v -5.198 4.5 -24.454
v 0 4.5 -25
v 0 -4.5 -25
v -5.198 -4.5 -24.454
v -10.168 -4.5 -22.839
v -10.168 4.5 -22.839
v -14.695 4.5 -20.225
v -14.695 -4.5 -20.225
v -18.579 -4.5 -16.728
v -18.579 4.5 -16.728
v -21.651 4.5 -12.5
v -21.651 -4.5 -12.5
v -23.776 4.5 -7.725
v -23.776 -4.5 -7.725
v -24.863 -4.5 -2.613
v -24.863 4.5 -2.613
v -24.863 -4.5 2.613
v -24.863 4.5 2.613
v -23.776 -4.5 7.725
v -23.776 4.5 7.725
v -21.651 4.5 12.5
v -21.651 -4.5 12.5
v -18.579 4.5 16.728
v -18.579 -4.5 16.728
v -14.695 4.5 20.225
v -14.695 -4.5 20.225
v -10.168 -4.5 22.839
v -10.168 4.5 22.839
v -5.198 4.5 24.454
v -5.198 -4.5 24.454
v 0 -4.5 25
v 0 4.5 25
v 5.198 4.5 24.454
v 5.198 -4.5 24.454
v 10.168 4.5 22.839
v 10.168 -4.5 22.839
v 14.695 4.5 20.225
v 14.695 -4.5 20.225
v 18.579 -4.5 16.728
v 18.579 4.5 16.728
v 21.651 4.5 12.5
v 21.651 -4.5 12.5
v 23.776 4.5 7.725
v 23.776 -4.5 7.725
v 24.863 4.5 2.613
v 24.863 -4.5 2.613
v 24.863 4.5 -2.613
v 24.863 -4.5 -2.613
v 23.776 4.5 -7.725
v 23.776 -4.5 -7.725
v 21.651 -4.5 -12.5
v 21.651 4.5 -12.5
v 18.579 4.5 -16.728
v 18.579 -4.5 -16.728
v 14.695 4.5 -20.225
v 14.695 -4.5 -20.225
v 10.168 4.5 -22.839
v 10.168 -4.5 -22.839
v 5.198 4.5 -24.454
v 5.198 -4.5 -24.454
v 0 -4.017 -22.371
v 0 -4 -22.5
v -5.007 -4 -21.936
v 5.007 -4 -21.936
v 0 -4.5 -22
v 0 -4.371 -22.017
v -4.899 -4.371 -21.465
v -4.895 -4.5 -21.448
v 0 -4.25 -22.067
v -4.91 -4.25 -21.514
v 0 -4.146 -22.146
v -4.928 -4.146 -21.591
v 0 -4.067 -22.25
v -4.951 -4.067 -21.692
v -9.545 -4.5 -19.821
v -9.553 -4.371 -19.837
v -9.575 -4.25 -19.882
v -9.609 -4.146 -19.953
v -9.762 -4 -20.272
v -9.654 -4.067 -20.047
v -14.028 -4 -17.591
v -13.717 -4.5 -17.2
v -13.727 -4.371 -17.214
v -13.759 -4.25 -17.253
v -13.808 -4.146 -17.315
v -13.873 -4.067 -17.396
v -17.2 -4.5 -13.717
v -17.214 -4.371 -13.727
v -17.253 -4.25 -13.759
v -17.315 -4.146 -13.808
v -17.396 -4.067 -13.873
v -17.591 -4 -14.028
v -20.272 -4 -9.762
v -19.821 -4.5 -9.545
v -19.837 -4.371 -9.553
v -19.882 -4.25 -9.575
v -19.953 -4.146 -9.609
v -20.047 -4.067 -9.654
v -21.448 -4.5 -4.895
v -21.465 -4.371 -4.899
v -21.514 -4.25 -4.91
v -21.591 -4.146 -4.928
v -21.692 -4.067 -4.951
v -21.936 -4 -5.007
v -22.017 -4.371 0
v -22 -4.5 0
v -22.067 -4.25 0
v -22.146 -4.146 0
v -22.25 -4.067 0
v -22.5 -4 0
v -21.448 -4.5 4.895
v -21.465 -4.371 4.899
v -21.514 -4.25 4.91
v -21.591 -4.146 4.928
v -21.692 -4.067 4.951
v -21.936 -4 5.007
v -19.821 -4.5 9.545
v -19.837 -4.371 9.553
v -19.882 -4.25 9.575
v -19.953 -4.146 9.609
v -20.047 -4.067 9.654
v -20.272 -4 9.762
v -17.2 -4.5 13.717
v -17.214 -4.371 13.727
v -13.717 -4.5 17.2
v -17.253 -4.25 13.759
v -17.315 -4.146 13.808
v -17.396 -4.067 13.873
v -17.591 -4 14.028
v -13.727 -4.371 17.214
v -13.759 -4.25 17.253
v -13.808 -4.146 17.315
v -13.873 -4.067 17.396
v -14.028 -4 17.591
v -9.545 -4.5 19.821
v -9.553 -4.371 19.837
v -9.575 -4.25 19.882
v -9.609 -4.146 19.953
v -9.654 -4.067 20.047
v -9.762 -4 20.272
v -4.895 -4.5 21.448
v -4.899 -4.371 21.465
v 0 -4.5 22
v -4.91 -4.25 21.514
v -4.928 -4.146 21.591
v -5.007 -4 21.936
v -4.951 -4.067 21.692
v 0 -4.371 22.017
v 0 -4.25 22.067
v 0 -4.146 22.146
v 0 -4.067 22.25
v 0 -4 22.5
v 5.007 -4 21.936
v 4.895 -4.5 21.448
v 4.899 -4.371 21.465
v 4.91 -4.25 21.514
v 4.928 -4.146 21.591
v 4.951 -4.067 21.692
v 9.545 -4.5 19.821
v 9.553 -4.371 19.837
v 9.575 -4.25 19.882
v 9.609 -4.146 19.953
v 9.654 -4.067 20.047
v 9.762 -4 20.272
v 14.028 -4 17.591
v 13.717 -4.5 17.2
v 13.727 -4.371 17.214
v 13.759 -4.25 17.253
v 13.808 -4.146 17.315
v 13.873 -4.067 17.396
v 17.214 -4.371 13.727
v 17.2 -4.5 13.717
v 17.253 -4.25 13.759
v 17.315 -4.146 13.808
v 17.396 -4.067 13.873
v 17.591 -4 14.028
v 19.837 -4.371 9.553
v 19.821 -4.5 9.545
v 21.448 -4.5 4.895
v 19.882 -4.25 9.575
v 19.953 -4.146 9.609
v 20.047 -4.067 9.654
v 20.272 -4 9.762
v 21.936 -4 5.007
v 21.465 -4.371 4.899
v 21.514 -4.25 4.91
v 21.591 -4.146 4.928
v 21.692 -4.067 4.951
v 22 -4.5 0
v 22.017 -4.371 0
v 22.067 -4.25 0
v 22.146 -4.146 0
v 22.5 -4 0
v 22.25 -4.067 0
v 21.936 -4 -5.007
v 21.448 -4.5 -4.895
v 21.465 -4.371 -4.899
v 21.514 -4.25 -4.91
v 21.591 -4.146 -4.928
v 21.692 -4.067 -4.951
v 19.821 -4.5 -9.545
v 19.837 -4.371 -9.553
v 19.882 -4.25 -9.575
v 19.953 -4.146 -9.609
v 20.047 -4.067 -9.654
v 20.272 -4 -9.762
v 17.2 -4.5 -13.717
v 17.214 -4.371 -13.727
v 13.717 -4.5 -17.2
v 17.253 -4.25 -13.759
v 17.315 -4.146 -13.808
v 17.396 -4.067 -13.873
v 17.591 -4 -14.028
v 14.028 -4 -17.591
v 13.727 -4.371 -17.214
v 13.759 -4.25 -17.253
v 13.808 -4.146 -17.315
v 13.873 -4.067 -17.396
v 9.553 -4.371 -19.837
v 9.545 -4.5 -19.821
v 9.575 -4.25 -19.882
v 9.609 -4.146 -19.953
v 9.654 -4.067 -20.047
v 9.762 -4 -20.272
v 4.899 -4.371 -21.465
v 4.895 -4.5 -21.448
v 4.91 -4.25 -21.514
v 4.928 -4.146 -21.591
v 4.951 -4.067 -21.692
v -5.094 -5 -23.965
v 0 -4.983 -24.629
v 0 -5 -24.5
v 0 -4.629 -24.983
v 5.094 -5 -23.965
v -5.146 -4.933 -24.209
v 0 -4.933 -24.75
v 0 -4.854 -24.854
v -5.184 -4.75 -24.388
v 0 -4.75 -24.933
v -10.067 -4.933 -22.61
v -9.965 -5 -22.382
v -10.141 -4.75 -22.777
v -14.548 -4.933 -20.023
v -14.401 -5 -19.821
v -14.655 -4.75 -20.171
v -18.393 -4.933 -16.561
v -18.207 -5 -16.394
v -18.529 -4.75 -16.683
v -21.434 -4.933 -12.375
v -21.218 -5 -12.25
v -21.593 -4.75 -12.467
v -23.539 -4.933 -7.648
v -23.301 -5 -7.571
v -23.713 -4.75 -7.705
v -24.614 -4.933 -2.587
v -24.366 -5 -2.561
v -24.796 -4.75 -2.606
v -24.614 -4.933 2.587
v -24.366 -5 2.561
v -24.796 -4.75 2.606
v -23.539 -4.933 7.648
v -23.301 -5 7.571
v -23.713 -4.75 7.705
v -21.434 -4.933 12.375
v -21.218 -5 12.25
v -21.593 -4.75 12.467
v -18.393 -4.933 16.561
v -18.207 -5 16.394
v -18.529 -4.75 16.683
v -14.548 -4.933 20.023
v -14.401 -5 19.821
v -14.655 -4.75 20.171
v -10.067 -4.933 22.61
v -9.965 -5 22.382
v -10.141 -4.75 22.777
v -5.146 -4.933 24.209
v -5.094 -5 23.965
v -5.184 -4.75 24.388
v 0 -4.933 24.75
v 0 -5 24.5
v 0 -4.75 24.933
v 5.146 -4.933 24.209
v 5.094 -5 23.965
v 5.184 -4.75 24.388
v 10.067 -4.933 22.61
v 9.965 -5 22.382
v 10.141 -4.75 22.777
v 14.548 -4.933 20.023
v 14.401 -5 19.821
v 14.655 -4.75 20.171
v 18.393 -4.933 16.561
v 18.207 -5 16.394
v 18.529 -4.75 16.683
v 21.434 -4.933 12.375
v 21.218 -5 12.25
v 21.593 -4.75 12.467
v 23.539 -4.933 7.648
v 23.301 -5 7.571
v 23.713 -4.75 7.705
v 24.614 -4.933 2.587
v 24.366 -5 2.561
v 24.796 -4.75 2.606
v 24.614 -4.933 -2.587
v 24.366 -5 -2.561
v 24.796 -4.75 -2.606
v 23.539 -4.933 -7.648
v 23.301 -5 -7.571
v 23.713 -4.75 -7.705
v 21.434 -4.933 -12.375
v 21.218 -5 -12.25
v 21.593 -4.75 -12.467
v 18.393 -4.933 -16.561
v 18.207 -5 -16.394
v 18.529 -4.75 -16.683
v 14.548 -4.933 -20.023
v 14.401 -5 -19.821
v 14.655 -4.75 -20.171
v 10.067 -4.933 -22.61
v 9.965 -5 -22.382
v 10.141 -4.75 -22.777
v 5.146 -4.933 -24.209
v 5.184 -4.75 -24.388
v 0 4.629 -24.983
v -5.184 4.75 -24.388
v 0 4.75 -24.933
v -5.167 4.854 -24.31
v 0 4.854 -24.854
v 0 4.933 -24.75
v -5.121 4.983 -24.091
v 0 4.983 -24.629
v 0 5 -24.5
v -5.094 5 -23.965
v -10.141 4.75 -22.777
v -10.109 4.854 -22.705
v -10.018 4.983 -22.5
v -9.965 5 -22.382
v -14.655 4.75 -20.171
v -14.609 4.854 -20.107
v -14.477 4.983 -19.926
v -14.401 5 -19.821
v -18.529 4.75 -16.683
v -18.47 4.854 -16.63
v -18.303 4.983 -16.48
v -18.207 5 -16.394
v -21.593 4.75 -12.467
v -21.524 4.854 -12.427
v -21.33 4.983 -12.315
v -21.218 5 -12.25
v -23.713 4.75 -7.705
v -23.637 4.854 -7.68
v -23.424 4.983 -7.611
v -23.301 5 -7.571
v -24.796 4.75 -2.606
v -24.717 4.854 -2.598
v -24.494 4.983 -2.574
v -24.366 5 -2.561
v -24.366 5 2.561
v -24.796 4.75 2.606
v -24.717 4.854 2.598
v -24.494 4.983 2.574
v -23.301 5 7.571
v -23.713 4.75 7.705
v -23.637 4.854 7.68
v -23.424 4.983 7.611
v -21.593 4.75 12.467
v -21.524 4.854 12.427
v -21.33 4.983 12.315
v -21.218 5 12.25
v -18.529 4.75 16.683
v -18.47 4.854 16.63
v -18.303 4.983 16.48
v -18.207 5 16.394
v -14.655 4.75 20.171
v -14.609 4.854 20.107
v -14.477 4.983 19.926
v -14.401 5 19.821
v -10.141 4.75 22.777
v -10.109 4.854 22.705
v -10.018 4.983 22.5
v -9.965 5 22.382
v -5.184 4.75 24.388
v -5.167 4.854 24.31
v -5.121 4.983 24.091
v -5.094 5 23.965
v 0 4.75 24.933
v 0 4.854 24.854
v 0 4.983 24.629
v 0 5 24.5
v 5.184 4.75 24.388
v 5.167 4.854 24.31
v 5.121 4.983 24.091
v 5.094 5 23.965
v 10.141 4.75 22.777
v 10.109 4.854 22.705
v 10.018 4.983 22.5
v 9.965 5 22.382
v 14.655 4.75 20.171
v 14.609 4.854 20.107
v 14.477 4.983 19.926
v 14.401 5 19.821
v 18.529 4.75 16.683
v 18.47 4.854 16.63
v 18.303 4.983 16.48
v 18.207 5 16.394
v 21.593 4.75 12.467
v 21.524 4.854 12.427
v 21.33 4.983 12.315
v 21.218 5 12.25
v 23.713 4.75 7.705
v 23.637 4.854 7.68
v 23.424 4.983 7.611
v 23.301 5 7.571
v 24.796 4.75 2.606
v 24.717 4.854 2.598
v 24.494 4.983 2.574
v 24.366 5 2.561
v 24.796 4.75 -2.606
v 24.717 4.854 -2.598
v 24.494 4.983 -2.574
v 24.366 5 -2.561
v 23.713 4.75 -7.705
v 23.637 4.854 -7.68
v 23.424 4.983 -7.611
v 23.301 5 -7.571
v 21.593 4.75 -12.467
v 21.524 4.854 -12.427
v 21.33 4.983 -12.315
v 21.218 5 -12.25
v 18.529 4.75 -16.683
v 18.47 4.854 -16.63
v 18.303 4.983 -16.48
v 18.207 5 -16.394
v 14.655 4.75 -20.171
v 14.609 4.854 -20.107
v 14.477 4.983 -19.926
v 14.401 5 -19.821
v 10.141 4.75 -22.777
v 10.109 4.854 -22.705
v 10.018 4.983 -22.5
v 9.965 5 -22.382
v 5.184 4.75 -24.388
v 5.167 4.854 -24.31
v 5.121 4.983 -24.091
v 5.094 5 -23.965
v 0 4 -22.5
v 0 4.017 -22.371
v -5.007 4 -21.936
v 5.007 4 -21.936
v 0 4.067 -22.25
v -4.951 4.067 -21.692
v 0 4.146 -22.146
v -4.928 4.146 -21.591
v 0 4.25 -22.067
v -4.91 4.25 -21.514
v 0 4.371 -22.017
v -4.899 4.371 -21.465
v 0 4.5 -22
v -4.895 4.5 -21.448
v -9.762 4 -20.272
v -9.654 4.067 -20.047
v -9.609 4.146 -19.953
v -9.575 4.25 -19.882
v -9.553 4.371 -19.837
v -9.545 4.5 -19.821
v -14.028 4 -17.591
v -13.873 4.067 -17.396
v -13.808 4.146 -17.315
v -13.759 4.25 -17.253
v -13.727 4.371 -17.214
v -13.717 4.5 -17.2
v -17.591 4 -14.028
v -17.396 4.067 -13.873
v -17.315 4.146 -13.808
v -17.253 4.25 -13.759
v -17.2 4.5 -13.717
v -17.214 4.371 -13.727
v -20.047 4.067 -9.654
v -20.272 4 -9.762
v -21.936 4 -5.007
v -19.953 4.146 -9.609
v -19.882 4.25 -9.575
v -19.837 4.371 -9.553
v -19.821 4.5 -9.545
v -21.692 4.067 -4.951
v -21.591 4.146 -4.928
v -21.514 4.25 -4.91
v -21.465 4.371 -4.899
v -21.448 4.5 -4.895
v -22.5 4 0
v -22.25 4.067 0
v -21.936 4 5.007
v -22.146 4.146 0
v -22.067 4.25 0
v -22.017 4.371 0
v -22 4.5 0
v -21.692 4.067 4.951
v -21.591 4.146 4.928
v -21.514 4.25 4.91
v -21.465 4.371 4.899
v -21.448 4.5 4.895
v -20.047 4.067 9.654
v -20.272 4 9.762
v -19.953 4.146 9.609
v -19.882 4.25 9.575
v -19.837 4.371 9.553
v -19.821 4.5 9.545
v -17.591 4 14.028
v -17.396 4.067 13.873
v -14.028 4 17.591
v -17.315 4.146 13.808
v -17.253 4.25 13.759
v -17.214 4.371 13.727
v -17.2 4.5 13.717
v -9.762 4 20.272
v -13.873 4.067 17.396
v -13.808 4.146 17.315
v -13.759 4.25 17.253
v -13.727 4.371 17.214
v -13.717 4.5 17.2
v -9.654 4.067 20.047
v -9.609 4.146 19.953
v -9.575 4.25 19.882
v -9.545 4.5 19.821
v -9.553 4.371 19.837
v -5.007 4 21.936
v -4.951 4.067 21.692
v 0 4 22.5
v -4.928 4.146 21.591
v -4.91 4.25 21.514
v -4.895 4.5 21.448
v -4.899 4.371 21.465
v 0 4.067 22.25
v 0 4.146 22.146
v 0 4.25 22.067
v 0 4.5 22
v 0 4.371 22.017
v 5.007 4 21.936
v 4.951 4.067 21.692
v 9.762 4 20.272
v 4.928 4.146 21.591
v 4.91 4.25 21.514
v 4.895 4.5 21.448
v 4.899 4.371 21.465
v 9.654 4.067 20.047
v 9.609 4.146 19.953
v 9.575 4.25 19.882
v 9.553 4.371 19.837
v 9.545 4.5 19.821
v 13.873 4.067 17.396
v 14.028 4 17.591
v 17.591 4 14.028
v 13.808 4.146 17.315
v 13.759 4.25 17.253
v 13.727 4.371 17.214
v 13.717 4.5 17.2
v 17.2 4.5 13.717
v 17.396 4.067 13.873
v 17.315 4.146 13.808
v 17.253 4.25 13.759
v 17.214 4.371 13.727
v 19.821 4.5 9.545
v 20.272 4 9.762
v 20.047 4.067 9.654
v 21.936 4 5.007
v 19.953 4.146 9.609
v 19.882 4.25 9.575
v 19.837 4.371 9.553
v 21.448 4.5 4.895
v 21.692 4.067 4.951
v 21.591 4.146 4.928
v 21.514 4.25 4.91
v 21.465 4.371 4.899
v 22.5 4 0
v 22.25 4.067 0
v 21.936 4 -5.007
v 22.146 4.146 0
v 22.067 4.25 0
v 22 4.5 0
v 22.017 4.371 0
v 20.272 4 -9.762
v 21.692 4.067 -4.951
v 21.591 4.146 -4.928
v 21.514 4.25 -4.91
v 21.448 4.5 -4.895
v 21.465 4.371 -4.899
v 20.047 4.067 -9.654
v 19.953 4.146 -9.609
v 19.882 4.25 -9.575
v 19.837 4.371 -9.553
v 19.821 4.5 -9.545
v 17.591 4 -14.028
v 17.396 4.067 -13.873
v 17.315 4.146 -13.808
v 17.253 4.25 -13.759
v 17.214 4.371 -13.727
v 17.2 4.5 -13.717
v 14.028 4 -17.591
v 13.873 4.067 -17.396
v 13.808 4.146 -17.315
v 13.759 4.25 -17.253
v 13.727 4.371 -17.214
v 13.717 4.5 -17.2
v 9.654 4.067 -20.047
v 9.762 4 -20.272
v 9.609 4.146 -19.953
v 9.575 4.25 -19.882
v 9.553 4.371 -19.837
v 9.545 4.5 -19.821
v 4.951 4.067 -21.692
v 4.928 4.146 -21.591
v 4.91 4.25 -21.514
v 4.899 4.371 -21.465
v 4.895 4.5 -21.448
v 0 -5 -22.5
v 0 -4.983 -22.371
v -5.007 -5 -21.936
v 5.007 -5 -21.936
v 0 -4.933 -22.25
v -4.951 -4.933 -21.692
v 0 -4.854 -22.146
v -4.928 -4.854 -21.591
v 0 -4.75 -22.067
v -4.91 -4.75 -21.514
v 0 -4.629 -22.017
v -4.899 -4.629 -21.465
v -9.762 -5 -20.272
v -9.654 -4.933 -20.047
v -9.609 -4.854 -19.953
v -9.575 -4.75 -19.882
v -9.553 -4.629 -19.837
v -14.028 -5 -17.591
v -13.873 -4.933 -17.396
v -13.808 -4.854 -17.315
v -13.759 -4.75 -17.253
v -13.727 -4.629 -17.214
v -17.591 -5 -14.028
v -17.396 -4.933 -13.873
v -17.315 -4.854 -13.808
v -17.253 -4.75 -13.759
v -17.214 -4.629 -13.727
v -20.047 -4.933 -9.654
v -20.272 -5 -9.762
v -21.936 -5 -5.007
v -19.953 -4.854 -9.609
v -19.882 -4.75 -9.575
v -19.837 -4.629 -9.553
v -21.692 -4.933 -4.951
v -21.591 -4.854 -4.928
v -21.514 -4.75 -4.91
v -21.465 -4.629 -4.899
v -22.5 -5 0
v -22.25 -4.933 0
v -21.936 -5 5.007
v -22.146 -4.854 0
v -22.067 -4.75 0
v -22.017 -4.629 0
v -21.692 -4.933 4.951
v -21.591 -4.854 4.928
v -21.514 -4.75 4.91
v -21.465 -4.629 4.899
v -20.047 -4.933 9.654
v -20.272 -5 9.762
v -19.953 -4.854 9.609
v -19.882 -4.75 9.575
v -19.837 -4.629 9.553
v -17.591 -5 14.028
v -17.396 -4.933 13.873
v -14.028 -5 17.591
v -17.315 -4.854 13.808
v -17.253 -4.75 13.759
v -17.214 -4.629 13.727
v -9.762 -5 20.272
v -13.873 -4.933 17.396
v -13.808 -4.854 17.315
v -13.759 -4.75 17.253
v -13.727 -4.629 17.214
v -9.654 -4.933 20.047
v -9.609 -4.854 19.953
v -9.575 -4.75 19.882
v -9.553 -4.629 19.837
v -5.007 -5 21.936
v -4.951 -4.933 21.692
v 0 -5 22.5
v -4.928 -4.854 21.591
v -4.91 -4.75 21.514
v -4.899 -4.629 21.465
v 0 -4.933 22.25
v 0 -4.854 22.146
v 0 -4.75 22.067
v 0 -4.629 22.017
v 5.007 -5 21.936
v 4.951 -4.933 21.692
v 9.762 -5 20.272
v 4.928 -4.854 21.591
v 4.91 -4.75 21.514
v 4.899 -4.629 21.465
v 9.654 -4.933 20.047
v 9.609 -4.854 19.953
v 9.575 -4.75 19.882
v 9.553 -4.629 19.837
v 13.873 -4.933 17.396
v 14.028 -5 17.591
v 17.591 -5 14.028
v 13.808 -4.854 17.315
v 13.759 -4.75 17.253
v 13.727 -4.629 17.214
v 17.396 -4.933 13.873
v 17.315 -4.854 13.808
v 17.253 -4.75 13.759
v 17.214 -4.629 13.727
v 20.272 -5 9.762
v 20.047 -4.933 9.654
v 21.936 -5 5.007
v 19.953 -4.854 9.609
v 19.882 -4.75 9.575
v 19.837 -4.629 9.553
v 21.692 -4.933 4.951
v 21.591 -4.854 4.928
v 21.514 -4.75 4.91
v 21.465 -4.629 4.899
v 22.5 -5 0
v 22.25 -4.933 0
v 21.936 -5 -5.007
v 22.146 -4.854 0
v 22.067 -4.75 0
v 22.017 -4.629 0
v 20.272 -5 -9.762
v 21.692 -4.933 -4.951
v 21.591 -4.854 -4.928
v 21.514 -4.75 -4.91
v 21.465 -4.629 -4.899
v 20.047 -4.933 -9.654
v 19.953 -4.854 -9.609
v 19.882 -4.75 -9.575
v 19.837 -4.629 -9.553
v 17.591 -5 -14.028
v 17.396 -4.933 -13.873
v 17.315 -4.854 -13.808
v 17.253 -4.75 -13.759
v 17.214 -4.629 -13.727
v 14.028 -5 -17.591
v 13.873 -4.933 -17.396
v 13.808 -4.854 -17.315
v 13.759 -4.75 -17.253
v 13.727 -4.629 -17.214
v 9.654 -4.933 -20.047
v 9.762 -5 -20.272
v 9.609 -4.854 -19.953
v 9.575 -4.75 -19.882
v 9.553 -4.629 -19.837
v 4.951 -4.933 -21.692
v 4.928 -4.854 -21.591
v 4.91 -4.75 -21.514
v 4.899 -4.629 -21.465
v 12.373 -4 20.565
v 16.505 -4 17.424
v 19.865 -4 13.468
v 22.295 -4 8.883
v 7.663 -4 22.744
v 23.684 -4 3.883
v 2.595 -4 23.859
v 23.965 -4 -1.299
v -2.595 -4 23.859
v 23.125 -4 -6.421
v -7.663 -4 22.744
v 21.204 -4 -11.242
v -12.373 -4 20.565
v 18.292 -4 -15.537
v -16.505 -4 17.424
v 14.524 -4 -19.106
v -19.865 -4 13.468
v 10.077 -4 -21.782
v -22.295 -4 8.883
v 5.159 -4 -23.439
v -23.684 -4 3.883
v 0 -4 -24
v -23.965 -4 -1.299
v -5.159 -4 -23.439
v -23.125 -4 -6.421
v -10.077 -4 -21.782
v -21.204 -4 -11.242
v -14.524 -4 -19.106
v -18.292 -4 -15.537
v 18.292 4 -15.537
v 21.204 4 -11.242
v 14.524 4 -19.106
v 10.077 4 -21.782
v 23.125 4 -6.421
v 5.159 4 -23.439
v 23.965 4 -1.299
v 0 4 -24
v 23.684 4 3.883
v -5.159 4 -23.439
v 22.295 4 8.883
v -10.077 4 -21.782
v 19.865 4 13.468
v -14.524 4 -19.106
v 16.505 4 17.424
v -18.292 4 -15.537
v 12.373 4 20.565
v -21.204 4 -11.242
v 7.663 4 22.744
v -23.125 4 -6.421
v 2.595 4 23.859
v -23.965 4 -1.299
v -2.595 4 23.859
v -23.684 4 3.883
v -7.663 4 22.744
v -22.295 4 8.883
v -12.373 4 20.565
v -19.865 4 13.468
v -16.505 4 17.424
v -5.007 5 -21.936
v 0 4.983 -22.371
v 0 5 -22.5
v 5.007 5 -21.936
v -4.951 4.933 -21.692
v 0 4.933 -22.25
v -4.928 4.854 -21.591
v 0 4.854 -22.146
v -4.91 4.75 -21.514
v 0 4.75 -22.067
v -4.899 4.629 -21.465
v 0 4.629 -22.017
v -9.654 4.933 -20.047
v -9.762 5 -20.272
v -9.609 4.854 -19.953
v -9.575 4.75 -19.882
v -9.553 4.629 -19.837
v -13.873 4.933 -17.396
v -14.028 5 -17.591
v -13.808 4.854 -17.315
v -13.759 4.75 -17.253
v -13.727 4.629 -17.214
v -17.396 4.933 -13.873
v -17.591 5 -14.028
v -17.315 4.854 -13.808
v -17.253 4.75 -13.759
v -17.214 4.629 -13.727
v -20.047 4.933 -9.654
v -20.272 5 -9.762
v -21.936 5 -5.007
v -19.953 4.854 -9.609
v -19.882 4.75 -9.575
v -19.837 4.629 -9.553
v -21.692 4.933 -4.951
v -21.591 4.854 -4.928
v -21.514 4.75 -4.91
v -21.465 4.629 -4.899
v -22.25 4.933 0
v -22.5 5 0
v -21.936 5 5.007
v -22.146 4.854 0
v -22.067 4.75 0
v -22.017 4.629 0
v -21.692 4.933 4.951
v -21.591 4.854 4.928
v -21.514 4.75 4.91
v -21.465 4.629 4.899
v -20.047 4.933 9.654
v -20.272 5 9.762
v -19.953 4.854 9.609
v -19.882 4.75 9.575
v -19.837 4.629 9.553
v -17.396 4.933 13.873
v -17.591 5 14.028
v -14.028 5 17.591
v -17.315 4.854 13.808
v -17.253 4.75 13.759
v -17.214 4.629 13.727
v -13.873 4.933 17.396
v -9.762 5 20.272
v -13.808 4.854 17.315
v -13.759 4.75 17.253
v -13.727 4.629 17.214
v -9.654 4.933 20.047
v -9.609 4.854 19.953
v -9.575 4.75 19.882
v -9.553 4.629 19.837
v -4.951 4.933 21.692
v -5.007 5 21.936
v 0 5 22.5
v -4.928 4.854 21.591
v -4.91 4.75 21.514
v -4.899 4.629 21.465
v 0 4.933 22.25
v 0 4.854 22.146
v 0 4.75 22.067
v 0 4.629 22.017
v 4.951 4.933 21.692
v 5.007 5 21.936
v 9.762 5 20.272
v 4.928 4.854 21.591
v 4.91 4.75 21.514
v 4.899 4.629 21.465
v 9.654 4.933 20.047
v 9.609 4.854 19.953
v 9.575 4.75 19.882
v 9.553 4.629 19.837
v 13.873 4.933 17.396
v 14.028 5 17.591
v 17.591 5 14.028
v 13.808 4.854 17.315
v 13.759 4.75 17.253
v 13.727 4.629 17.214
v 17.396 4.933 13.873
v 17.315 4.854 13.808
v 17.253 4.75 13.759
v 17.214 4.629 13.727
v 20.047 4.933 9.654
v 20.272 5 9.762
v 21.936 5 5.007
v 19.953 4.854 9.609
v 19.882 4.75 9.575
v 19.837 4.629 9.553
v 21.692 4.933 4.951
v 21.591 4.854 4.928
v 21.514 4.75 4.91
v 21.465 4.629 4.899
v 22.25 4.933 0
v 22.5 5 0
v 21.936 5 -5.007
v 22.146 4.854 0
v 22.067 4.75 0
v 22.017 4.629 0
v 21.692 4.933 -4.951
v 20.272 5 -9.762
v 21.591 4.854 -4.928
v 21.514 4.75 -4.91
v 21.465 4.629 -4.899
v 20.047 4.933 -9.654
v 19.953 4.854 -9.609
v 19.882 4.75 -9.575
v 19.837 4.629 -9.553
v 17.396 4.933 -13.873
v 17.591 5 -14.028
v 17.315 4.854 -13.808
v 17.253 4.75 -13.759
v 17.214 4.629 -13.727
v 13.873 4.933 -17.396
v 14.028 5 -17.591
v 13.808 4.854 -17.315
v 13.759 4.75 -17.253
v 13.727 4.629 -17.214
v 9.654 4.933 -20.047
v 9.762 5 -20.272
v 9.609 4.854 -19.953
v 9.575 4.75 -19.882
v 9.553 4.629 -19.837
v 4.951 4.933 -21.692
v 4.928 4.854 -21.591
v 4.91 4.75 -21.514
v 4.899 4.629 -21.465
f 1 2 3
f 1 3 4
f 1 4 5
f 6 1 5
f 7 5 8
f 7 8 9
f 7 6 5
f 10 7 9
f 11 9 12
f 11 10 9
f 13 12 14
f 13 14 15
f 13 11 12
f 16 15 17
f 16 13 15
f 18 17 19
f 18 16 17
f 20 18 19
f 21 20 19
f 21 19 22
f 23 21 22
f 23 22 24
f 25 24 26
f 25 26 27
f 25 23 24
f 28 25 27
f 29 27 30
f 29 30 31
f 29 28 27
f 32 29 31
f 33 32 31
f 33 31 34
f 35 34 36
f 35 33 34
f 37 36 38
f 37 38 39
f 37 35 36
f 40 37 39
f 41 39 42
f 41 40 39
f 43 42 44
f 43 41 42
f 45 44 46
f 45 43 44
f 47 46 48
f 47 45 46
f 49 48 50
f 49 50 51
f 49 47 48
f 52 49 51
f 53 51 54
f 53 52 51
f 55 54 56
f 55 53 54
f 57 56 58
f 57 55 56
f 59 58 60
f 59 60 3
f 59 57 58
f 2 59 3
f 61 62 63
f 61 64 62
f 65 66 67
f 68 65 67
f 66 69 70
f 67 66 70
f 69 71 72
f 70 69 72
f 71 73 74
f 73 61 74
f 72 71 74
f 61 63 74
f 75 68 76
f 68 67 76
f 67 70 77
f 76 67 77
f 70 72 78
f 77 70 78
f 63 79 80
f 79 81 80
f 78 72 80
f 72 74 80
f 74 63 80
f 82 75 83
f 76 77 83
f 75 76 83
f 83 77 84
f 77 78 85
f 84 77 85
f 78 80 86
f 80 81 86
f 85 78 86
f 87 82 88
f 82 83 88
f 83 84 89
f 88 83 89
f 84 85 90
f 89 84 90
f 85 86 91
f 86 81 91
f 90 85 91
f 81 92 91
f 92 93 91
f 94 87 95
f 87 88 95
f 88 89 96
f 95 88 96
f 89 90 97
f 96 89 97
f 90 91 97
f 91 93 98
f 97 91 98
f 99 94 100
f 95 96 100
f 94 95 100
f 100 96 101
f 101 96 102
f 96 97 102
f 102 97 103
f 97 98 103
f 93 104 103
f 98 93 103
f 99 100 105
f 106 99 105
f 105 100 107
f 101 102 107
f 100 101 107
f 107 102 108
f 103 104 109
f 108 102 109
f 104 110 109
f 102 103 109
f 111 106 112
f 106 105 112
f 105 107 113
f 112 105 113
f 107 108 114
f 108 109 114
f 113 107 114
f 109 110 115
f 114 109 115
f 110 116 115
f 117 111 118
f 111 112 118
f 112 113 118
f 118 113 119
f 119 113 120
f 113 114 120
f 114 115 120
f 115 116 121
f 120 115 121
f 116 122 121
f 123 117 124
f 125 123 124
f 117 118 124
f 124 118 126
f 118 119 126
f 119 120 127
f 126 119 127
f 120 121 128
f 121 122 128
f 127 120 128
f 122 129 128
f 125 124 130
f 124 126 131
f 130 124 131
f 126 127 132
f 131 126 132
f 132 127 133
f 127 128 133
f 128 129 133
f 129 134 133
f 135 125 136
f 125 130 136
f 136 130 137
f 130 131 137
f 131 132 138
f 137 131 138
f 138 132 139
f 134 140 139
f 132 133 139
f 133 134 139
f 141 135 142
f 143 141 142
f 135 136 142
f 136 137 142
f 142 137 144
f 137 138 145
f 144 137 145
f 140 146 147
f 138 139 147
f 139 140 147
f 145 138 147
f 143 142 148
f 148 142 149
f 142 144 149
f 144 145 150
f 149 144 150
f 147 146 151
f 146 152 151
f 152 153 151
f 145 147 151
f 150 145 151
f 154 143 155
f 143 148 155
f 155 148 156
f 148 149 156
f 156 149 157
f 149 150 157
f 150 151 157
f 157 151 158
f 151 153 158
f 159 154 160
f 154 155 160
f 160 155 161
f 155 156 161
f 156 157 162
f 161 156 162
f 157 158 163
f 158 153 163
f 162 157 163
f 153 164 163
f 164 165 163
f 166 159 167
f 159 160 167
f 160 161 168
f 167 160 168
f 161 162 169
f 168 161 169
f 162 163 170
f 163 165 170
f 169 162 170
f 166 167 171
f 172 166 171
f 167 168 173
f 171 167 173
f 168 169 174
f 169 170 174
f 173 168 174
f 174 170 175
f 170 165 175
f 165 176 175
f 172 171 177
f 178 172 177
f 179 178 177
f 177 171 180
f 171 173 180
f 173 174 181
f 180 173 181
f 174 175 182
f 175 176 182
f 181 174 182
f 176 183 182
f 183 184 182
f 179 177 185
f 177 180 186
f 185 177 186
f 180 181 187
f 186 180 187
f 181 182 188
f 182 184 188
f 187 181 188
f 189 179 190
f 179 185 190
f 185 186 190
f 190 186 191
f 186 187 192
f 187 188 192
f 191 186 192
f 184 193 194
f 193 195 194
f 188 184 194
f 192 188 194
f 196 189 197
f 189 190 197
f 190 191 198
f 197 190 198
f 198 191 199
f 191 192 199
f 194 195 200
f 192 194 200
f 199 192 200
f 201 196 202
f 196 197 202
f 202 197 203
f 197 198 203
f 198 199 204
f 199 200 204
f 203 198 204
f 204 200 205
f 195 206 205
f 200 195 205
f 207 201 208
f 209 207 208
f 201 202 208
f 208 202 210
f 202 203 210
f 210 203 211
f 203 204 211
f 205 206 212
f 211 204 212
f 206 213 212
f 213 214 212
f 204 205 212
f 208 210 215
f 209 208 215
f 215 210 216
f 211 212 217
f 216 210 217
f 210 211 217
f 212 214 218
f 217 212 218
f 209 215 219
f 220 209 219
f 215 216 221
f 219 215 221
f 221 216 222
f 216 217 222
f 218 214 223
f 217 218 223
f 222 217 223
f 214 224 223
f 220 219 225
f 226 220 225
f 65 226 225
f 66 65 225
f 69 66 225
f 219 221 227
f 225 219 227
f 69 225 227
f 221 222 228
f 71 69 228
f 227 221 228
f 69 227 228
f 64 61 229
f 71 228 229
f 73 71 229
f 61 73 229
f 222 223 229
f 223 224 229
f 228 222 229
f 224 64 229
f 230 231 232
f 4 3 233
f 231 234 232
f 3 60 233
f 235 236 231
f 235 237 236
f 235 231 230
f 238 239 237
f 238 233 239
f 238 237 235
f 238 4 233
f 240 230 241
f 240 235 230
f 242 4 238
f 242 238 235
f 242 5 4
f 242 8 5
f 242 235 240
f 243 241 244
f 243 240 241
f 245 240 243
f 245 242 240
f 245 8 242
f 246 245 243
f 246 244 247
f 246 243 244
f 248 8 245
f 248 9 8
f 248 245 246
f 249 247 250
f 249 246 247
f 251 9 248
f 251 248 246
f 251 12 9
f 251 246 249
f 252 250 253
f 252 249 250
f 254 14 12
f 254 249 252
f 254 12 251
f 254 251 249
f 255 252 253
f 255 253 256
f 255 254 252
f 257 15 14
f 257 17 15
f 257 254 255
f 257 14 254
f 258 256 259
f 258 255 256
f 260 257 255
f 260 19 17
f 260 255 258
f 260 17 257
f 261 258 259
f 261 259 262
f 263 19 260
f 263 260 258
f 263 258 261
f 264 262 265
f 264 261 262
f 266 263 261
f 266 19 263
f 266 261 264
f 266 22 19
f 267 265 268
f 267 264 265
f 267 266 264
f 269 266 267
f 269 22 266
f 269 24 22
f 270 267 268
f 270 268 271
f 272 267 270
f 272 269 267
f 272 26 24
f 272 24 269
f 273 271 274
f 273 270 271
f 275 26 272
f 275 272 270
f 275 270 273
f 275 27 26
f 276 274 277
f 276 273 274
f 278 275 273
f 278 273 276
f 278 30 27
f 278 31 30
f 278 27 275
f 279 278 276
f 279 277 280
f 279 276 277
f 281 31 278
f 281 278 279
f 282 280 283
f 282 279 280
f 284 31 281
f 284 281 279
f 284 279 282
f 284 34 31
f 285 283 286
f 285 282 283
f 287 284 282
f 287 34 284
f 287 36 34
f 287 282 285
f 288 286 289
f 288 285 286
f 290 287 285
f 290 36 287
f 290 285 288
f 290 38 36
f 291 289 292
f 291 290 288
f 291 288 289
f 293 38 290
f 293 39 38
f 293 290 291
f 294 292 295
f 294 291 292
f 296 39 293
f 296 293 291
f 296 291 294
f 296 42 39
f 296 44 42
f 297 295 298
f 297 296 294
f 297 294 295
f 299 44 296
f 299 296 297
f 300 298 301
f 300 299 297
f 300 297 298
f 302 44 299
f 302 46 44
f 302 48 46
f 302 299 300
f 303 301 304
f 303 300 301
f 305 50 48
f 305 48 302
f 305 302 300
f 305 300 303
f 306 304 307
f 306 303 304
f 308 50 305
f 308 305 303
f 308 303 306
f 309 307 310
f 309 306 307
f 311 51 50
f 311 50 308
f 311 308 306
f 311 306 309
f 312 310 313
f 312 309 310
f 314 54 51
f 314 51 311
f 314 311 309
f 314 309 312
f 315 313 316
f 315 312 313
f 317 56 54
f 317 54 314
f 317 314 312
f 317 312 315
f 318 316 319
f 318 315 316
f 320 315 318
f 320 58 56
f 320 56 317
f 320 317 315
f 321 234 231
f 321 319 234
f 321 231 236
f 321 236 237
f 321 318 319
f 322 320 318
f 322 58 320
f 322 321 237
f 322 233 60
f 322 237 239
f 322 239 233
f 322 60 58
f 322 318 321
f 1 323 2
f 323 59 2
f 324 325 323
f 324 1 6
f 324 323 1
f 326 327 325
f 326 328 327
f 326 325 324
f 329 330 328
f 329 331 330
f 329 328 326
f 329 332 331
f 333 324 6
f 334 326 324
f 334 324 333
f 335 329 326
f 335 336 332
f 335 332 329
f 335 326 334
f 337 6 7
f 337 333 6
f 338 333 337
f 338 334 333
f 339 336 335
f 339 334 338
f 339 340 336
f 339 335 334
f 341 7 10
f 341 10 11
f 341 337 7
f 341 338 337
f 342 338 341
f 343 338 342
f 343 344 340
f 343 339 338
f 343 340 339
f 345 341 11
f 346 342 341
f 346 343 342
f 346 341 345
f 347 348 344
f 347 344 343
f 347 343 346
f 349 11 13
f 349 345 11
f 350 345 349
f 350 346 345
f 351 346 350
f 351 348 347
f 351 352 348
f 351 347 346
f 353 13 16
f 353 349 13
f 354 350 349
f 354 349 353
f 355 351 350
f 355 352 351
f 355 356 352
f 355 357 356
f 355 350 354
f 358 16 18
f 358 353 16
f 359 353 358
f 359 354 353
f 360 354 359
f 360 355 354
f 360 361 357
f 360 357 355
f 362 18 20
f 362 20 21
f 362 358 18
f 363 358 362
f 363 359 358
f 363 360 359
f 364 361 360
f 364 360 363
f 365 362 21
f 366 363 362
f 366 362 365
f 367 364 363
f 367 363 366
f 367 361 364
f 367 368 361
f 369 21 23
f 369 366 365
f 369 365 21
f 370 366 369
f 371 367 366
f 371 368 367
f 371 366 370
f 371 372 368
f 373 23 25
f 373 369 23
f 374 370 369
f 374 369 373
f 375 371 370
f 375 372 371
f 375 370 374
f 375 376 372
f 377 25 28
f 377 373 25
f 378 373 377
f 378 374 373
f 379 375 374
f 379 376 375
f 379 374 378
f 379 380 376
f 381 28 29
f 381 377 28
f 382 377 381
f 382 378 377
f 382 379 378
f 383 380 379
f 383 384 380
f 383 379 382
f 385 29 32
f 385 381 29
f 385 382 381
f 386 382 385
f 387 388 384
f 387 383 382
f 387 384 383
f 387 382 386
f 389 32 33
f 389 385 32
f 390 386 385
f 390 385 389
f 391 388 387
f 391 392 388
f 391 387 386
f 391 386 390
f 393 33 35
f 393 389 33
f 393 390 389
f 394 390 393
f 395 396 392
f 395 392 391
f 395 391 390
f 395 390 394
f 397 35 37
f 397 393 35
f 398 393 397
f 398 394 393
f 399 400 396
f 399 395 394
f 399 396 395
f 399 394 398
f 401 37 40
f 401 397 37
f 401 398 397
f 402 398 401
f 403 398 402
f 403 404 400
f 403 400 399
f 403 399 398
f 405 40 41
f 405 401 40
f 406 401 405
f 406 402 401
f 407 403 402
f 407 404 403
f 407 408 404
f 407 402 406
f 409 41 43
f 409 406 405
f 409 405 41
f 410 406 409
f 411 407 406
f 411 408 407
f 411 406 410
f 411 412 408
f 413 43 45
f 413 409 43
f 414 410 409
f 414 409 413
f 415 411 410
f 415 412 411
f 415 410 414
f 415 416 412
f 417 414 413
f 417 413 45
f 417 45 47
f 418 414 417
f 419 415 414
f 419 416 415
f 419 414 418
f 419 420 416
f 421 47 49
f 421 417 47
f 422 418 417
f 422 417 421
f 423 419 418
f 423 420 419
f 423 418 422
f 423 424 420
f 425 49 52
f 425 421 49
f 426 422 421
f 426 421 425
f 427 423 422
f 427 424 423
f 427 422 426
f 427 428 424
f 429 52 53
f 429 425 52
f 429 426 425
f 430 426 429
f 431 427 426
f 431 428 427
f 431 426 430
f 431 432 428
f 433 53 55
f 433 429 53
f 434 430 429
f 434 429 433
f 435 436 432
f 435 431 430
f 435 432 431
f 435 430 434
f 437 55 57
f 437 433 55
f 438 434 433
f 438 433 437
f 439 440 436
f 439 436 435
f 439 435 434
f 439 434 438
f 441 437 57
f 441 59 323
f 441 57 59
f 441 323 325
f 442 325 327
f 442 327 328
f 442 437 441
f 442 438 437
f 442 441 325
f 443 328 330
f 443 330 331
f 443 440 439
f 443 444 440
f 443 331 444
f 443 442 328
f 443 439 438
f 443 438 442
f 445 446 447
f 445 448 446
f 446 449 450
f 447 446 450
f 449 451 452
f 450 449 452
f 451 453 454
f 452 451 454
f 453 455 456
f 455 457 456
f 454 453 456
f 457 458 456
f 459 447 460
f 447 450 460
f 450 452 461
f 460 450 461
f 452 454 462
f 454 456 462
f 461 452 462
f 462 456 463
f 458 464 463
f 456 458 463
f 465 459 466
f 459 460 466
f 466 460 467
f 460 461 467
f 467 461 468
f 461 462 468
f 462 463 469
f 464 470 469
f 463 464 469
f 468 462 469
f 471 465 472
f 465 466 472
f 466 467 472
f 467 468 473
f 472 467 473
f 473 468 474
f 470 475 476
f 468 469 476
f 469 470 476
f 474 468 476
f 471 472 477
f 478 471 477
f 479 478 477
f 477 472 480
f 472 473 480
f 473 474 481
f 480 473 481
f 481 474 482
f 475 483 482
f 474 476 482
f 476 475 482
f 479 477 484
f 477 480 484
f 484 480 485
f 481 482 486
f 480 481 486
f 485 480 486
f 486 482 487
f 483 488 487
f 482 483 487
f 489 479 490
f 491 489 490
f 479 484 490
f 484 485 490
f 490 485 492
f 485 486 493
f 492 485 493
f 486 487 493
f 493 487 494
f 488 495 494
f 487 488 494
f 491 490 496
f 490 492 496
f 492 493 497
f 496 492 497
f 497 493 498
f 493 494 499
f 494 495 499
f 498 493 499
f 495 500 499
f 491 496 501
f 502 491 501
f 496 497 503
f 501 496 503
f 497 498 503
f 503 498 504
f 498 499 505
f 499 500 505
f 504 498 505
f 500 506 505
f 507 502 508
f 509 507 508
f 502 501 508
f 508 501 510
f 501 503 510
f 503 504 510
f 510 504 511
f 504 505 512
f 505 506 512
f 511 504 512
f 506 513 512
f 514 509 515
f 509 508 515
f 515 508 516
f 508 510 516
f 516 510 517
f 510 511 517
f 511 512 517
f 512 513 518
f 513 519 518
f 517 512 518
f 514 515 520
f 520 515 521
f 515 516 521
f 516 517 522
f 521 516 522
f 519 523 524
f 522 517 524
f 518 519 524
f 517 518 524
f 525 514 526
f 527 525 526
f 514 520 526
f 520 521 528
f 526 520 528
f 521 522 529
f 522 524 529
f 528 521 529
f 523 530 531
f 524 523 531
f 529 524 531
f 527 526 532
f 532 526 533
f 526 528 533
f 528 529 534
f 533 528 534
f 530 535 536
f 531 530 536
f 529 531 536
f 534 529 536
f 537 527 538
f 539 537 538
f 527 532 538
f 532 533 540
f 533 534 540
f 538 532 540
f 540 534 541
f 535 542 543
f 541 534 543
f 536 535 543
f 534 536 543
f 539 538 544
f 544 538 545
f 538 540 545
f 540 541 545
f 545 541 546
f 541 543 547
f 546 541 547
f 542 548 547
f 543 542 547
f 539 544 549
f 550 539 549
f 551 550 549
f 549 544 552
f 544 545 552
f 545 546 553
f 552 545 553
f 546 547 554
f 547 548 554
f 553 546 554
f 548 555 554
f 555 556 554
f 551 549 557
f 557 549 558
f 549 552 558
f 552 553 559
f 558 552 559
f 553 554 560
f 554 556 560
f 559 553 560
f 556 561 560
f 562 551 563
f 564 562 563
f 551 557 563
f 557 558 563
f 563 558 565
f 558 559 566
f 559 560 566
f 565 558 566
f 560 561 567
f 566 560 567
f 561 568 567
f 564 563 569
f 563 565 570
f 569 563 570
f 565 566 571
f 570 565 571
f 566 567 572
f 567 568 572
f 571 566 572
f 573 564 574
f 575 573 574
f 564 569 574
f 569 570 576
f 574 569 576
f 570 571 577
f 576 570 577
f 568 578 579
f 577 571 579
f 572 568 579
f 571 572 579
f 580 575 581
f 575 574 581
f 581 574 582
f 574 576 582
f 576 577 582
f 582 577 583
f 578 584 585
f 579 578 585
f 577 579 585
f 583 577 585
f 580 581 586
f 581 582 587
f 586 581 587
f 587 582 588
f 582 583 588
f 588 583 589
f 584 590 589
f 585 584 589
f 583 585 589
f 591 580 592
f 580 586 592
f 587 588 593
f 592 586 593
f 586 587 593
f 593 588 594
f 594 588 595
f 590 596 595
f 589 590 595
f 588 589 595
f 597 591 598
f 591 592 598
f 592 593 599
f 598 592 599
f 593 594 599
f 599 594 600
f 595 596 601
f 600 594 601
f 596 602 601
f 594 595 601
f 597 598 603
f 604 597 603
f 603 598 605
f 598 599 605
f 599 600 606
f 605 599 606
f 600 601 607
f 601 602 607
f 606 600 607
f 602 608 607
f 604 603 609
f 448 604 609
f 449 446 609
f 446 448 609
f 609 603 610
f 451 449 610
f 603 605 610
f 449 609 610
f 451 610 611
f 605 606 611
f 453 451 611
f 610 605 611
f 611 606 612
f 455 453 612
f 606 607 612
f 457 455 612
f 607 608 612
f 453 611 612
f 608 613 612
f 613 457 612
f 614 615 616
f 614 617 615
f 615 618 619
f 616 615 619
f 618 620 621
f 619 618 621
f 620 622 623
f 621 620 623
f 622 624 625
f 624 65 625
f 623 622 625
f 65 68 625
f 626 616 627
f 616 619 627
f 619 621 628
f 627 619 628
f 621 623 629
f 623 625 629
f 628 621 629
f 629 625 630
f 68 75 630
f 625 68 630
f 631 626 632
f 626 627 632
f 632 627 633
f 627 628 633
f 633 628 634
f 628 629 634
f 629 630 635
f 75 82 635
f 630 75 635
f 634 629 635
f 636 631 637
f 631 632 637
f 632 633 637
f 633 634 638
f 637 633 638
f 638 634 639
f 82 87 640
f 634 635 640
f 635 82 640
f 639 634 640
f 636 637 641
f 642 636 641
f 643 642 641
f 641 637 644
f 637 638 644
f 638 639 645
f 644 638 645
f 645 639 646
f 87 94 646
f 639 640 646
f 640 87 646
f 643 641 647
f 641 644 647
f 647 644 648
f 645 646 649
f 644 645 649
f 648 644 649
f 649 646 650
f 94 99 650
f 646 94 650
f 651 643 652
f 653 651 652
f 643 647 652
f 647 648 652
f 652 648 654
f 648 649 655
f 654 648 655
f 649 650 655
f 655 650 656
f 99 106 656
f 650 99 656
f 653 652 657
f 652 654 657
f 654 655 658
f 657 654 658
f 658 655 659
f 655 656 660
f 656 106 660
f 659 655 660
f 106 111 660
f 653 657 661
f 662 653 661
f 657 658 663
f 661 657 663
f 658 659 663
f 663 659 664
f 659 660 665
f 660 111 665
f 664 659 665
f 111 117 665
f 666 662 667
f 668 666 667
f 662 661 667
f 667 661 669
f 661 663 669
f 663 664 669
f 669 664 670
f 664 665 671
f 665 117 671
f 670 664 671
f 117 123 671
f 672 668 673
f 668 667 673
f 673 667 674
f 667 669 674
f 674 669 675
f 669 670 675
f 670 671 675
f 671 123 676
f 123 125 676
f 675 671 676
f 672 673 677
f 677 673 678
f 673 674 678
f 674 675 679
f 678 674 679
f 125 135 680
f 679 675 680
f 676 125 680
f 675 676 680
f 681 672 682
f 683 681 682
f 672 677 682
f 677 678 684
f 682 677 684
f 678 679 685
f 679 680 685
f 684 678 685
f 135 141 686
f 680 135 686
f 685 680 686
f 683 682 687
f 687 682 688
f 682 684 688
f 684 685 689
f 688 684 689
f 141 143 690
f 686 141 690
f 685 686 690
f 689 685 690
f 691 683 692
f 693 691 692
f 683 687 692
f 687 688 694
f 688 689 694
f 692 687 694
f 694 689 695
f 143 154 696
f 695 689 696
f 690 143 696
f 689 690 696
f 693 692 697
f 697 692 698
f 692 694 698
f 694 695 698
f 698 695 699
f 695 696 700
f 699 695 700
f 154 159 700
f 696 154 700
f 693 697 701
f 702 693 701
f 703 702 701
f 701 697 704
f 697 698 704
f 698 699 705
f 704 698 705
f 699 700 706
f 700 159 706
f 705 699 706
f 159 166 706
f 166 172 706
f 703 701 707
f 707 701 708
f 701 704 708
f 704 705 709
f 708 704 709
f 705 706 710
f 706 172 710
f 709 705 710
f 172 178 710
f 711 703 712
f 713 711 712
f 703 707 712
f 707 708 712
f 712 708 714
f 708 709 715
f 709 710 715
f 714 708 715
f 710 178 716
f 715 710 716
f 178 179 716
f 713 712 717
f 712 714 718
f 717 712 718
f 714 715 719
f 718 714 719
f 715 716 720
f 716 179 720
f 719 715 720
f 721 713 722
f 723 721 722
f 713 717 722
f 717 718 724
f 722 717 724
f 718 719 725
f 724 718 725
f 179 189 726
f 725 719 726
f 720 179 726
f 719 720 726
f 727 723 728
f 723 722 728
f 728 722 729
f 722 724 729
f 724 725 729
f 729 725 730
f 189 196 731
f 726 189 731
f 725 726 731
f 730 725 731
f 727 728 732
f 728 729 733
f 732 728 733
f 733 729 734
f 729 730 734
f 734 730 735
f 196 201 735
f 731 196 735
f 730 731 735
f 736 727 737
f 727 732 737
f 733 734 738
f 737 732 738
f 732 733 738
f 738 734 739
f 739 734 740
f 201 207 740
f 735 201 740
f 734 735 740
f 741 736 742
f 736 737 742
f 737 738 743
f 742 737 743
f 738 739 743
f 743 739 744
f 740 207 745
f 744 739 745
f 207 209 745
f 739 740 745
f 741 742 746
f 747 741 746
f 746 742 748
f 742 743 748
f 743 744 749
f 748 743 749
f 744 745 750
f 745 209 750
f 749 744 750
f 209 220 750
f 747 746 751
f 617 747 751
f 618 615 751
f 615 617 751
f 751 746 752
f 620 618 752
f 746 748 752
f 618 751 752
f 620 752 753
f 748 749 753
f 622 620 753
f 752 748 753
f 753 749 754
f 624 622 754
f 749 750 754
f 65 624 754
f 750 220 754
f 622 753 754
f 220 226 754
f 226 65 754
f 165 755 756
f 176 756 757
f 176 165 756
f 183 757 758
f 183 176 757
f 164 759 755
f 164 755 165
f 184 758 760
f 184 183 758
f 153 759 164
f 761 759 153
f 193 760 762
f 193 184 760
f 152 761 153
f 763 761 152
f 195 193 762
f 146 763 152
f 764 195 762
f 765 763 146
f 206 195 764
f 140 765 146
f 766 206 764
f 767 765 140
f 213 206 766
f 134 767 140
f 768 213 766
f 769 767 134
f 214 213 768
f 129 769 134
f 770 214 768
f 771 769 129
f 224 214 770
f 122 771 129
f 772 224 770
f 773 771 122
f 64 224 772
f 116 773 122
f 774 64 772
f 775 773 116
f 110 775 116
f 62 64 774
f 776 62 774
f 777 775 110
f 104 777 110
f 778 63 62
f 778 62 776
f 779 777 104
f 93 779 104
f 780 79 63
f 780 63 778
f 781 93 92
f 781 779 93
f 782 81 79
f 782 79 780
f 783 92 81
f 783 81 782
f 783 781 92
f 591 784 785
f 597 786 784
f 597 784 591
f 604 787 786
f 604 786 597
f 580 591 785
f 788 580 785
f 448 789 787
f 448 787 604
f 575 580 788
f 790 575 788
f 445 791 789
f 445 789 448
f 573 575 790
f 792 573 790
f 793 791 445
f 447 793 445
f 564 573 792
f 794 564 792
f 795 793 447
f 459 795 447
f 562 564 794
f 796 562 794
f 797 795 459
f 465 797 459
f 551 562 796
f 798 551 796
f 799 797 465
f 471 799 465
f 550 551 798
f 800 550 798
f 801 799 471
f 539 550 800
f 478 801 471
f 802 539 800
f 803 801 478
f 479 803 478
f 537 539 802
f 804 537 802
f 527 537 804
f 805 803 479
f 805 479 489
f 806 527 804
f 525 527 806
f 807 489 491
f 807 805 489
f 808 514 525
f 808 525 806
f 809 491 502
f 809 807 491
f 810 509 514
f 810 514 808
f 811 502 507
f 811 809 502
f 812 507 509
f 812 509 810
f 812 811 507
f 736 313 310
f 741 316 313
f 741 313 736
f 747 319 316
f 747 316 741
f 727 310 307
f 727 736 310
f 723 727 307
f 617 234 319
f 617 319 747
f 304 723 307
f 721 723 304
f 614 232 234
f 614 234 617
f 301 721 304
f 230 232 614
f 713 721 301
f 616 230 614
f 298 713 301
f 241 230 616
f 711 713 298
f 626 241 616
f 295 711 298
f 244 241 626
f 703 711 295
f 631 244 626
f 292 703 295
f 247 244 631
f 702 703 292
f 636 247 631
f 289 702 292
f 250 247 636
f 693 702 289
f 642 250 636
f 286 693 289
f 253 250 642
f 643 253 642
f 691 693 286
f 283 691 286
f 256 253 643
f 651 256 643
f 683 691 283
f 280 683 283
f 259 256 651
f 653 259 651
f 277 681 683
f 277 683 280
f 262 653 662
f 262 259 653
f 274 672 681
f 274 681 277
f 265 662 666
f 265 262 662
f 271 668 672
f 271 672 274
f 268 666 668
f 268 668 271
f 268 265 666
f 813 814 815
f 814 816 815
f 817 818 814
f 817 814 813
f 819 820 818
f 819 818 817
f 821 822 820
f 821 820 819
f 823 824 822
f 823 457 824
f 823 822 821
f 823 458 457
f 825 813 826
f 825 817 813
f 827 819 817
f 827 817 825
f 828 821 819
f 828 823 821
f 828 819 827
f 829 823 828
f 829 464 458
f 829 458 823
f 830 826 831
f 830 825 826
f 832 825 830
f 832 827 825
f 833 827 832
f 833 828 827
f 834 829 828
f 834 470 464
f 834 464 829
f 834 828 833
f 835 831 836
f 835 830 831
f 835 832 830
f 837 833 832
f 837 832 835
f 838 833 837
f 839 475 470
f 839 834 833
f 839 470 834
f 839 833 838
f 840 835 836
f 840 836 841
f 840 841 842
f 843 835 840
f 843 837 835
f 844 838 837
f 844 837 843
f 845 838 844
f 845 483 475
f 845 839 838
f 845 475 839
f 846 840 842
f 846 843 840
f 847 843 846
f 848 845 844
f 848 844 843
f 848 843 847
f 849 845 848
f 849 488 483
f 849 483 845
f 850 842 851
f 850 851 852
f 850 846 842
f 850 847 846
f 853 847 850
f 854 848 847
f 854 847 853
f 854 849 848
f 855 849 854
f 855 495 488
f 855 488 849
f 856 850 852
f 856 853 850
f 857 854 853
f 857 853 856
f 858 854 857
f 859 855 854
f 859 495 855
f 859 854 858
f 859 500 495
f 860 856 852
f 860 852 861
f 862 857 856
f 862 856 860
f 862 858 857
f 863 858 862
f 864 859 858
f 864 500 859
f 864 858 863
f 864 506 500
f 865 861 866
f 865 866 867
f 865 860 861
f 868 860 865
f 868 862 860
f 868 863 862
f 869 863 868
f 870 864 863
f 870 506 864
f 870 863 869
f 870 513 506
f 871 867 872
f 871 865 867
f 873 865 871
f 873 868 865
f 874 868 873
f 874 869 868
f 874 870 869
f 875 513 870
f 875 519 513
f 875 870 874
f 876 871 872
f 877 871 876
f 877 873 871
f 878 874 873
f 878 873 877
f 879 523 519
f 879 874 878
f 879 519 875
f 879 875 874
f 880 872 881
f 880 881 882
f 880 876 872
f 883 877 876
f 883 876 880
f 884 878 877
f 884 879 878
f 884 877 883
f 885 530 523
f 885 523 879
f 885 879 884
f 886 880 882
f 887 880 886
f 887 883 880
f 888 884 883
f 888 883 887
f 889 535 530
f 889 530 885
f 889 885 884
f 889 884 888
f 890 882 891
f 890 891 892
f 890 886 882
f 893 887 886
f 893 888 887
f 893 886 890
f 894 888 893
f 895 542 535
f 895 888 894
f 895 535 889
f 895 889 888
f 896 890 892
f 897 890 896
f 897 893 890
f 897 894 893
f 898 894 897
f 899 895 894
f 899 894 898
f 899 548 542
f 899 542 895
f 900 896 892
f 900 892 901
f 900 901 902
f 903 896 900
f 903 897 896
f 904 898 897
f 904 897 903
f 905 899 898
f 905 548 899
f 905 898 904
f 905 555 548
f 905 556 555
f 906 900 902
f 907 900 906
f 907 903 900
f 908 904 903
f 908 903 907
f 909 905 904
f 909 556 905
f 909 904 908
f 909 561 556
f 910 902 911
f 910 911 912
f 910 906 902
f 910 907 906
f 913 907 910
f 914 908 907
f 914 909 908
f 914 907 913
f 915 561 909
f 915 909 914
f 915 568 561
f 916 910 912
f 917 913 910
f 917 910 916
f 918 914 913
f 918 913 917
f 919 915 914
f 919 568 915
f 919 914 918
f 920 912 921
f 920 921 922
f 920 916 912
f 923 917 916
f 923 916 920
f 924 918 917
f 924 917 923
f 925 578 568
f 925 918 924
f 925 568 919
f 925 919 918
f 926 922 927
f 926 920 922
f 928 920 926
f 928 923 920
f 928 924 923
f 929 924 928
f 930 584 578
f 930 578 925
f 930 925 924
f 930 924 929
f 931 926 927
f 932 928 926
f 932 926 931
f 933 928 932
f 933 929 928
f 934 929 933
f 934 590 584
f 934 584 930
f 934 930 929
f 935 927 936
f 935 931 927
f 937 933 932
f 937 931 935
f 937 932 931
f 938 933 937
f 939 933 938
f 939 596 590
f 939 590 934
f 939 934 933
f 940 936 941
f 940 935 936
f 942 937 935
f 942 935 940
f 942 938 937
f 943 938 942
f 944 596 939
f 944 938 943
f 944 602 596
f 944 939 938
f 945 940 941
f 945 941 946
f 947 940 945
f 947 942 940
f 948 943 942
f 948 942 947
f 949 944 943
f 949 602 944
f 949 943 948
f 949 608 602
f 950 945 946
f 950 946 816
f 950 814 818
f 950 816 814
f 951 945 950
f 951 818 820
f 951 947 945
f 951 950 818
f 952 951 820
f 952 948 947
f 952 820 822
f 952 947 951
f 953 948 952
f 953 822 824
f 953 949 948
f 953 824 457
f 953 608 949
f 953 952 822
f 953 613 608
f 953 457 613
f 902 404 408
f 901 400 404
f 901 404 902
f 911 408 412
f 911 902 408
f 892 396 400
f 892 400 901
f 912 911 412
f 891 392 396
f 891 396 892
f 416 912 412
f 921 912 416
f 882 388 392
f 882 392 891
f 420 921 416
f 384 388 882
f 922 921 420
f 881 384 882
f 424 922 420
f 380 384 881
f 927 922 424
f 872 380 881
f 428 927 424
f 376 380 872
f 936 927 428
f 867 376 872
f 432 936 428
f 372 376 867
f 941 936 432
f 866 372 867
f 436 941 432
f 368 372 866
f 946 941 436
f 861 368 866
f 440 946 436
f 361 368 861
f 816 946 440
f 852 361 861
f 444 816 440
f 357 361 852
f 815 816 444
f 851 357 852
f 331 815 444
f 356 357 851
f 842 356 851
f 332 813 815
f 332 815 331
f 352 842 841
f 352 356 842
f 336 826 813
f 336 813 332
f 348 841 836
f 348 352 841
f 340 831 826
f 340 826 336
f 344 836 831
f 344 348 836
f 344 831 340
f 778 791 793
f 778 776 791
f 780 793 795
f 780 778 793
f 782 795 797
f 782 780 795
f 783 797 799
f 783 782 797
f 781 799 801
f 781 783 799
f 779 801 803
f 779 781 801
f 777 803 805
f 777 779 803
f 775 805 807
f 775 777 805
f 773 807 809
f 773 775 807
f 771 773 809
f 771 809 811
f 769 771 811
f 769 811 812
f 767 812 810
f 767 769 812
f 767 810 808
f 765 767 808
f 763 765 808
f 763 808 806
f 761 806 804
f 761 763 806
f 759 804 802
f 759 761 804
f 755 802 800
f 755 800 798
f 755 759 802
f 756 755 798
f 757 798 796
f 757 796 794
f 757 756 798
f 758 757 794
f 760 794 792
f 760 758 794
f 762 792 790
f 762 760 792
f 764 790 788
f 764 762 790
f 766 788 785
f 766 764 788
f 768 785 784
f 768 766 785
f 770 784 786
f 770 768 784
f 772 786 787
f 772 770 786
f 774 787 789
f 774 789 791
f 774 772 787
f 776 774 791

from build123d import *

# Parameters (mm, degrees)
FILLET1_R = 0.5
FILLET2_R = 0.5
FILLET3_R = 0.5


with BuildPart() as part:
    # Sketch1 → Revolve1 (revolve)
    with BuildSketch(Plane.YZ, mode=Mode.PRIVATE) as revolve1_sk:
        Polygon((-5, 22), (-5, 25), (5, 25), (5, 22), (4, 22), (4, 24), (-4, 24), (-4, 22), align=None)
    revolve(revolve1_sk.sketch.rotate(Axis((0, -15.446930484, 0), (0, 1, 0)), 180), axis=Axis((0, -15.446930484, 0), (0, 1, 0)))

    # Fillet1
    fillet1_edges = [part.edges().sort_by_distance(p)[0] for p in [
        (0, 5, 25),
        (0, -5, 25),
    ]]
    fillet(fillet1_edges, radius=FILLET1_R)

    # Fillet2
    fillet2_edges = [part.edges().sort_by_distance(p)[0] for p in [
        (0, 4, 22),
        (0, 5, 22),
    ]]
    fillet(fillet2_edges, radius=FILLET2_R - 0.0001)  # a hair under: the kernel refuses the full size

    # Fillet3
    fillet3_edges = [part.edges().sort_by_distance(p)[0] for p in [
        (0, -5, 22),
        (0, -4, 22),
    ]]
    fillet(fillet3_edges, radius=FILLET3_R - 0.0001)  # a hair under: the kernel refuses the full size


solid = part.part
